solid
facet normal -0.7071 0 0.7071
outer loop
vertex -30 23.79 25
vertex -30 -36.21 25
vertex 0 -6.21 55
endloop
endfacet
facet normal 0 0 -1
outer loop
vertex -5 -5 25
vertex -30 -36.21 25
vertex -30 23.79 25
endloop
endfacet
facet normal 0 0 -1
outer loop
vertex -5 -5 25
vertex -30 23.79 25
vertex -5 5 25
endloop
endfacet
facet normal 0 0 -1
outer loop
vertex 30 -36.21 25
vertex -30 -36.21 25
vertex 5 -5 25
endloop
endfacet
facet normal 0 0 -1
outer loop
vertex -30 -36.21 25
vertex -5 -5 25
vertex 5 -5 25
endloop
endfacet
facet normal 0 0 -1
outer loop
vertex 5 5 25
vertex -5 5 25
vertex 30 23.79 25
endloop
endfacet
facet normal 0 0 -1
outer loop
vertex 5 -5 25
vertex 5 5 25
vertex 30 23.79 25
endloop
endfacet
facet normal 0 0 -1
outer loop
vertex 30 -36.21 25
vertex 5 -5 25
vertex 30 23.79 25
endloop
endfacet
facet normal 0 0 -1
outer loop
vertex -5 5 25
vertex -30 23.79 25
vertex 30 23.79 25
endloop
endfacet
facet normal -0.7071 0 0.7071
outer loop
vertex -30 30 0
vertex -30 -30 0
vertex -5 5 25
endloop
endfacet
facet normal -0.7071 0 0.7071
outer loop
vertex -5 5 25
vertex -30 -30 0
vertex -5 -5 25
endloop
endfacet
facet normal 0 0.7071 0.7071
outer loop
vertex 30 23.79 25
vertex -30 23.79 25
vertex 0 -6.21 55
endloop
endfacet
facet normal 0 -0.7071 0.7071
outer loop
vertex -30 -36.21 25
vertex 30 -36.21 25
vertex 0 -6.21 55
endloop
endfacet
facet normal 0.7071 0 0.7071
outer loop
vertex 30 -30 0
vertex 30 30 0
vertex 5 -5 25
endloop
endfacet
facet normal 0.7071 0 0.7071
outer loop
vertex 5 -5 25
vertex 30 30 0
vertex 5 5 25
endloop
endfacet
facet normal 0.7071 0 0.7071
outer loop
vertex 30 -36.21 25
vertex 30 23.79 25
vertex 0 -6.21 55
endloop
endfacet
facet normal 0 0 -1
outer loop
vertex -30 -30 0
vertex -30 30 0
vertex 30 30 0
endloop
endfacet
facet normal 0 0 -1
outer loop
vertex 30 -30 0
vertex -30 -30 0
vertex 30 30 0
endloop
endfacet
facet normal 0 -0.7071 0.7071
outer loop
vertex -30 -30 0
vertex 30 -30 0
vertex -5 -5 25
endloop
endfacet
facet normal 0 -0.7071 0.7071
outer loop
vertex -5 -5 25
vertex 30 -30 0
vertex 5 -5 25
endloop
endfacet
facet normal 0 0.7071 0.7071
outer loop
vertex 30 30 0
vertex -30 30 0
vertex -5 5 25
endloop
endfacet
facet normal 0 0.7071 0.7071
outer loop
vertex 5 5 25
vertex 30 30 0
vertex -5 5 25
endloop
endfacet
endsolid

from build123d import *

# Parameters (mm, degrees)
F0_W     = 60
F0_H     = 60
F1_DEPTH = 30
F1_TAPER = 45
F3_W     = 60
F3_H     = 60
F4_DEPTH = 30
F4_TAPER = 45


with BuildPart() as f1:
    # F0 (on Top) → F1 (new body)
    with BuildSketch(Plane.XY):
        Rectangle(F0_W, F0_H)
    extrude(amount=F1_DEPTH, taper=F1_TAPER)

    # F3 (on offset) → F4 (join)
    with BuildSketch(Plane.XY.offset(25)):
        with Locations((0, -6.210045305)):
            Rectangle(F3_W, F3_H)
    extrude(amount=F4_DEPTH, taper=F4_TAPER)


solid = f1.part
